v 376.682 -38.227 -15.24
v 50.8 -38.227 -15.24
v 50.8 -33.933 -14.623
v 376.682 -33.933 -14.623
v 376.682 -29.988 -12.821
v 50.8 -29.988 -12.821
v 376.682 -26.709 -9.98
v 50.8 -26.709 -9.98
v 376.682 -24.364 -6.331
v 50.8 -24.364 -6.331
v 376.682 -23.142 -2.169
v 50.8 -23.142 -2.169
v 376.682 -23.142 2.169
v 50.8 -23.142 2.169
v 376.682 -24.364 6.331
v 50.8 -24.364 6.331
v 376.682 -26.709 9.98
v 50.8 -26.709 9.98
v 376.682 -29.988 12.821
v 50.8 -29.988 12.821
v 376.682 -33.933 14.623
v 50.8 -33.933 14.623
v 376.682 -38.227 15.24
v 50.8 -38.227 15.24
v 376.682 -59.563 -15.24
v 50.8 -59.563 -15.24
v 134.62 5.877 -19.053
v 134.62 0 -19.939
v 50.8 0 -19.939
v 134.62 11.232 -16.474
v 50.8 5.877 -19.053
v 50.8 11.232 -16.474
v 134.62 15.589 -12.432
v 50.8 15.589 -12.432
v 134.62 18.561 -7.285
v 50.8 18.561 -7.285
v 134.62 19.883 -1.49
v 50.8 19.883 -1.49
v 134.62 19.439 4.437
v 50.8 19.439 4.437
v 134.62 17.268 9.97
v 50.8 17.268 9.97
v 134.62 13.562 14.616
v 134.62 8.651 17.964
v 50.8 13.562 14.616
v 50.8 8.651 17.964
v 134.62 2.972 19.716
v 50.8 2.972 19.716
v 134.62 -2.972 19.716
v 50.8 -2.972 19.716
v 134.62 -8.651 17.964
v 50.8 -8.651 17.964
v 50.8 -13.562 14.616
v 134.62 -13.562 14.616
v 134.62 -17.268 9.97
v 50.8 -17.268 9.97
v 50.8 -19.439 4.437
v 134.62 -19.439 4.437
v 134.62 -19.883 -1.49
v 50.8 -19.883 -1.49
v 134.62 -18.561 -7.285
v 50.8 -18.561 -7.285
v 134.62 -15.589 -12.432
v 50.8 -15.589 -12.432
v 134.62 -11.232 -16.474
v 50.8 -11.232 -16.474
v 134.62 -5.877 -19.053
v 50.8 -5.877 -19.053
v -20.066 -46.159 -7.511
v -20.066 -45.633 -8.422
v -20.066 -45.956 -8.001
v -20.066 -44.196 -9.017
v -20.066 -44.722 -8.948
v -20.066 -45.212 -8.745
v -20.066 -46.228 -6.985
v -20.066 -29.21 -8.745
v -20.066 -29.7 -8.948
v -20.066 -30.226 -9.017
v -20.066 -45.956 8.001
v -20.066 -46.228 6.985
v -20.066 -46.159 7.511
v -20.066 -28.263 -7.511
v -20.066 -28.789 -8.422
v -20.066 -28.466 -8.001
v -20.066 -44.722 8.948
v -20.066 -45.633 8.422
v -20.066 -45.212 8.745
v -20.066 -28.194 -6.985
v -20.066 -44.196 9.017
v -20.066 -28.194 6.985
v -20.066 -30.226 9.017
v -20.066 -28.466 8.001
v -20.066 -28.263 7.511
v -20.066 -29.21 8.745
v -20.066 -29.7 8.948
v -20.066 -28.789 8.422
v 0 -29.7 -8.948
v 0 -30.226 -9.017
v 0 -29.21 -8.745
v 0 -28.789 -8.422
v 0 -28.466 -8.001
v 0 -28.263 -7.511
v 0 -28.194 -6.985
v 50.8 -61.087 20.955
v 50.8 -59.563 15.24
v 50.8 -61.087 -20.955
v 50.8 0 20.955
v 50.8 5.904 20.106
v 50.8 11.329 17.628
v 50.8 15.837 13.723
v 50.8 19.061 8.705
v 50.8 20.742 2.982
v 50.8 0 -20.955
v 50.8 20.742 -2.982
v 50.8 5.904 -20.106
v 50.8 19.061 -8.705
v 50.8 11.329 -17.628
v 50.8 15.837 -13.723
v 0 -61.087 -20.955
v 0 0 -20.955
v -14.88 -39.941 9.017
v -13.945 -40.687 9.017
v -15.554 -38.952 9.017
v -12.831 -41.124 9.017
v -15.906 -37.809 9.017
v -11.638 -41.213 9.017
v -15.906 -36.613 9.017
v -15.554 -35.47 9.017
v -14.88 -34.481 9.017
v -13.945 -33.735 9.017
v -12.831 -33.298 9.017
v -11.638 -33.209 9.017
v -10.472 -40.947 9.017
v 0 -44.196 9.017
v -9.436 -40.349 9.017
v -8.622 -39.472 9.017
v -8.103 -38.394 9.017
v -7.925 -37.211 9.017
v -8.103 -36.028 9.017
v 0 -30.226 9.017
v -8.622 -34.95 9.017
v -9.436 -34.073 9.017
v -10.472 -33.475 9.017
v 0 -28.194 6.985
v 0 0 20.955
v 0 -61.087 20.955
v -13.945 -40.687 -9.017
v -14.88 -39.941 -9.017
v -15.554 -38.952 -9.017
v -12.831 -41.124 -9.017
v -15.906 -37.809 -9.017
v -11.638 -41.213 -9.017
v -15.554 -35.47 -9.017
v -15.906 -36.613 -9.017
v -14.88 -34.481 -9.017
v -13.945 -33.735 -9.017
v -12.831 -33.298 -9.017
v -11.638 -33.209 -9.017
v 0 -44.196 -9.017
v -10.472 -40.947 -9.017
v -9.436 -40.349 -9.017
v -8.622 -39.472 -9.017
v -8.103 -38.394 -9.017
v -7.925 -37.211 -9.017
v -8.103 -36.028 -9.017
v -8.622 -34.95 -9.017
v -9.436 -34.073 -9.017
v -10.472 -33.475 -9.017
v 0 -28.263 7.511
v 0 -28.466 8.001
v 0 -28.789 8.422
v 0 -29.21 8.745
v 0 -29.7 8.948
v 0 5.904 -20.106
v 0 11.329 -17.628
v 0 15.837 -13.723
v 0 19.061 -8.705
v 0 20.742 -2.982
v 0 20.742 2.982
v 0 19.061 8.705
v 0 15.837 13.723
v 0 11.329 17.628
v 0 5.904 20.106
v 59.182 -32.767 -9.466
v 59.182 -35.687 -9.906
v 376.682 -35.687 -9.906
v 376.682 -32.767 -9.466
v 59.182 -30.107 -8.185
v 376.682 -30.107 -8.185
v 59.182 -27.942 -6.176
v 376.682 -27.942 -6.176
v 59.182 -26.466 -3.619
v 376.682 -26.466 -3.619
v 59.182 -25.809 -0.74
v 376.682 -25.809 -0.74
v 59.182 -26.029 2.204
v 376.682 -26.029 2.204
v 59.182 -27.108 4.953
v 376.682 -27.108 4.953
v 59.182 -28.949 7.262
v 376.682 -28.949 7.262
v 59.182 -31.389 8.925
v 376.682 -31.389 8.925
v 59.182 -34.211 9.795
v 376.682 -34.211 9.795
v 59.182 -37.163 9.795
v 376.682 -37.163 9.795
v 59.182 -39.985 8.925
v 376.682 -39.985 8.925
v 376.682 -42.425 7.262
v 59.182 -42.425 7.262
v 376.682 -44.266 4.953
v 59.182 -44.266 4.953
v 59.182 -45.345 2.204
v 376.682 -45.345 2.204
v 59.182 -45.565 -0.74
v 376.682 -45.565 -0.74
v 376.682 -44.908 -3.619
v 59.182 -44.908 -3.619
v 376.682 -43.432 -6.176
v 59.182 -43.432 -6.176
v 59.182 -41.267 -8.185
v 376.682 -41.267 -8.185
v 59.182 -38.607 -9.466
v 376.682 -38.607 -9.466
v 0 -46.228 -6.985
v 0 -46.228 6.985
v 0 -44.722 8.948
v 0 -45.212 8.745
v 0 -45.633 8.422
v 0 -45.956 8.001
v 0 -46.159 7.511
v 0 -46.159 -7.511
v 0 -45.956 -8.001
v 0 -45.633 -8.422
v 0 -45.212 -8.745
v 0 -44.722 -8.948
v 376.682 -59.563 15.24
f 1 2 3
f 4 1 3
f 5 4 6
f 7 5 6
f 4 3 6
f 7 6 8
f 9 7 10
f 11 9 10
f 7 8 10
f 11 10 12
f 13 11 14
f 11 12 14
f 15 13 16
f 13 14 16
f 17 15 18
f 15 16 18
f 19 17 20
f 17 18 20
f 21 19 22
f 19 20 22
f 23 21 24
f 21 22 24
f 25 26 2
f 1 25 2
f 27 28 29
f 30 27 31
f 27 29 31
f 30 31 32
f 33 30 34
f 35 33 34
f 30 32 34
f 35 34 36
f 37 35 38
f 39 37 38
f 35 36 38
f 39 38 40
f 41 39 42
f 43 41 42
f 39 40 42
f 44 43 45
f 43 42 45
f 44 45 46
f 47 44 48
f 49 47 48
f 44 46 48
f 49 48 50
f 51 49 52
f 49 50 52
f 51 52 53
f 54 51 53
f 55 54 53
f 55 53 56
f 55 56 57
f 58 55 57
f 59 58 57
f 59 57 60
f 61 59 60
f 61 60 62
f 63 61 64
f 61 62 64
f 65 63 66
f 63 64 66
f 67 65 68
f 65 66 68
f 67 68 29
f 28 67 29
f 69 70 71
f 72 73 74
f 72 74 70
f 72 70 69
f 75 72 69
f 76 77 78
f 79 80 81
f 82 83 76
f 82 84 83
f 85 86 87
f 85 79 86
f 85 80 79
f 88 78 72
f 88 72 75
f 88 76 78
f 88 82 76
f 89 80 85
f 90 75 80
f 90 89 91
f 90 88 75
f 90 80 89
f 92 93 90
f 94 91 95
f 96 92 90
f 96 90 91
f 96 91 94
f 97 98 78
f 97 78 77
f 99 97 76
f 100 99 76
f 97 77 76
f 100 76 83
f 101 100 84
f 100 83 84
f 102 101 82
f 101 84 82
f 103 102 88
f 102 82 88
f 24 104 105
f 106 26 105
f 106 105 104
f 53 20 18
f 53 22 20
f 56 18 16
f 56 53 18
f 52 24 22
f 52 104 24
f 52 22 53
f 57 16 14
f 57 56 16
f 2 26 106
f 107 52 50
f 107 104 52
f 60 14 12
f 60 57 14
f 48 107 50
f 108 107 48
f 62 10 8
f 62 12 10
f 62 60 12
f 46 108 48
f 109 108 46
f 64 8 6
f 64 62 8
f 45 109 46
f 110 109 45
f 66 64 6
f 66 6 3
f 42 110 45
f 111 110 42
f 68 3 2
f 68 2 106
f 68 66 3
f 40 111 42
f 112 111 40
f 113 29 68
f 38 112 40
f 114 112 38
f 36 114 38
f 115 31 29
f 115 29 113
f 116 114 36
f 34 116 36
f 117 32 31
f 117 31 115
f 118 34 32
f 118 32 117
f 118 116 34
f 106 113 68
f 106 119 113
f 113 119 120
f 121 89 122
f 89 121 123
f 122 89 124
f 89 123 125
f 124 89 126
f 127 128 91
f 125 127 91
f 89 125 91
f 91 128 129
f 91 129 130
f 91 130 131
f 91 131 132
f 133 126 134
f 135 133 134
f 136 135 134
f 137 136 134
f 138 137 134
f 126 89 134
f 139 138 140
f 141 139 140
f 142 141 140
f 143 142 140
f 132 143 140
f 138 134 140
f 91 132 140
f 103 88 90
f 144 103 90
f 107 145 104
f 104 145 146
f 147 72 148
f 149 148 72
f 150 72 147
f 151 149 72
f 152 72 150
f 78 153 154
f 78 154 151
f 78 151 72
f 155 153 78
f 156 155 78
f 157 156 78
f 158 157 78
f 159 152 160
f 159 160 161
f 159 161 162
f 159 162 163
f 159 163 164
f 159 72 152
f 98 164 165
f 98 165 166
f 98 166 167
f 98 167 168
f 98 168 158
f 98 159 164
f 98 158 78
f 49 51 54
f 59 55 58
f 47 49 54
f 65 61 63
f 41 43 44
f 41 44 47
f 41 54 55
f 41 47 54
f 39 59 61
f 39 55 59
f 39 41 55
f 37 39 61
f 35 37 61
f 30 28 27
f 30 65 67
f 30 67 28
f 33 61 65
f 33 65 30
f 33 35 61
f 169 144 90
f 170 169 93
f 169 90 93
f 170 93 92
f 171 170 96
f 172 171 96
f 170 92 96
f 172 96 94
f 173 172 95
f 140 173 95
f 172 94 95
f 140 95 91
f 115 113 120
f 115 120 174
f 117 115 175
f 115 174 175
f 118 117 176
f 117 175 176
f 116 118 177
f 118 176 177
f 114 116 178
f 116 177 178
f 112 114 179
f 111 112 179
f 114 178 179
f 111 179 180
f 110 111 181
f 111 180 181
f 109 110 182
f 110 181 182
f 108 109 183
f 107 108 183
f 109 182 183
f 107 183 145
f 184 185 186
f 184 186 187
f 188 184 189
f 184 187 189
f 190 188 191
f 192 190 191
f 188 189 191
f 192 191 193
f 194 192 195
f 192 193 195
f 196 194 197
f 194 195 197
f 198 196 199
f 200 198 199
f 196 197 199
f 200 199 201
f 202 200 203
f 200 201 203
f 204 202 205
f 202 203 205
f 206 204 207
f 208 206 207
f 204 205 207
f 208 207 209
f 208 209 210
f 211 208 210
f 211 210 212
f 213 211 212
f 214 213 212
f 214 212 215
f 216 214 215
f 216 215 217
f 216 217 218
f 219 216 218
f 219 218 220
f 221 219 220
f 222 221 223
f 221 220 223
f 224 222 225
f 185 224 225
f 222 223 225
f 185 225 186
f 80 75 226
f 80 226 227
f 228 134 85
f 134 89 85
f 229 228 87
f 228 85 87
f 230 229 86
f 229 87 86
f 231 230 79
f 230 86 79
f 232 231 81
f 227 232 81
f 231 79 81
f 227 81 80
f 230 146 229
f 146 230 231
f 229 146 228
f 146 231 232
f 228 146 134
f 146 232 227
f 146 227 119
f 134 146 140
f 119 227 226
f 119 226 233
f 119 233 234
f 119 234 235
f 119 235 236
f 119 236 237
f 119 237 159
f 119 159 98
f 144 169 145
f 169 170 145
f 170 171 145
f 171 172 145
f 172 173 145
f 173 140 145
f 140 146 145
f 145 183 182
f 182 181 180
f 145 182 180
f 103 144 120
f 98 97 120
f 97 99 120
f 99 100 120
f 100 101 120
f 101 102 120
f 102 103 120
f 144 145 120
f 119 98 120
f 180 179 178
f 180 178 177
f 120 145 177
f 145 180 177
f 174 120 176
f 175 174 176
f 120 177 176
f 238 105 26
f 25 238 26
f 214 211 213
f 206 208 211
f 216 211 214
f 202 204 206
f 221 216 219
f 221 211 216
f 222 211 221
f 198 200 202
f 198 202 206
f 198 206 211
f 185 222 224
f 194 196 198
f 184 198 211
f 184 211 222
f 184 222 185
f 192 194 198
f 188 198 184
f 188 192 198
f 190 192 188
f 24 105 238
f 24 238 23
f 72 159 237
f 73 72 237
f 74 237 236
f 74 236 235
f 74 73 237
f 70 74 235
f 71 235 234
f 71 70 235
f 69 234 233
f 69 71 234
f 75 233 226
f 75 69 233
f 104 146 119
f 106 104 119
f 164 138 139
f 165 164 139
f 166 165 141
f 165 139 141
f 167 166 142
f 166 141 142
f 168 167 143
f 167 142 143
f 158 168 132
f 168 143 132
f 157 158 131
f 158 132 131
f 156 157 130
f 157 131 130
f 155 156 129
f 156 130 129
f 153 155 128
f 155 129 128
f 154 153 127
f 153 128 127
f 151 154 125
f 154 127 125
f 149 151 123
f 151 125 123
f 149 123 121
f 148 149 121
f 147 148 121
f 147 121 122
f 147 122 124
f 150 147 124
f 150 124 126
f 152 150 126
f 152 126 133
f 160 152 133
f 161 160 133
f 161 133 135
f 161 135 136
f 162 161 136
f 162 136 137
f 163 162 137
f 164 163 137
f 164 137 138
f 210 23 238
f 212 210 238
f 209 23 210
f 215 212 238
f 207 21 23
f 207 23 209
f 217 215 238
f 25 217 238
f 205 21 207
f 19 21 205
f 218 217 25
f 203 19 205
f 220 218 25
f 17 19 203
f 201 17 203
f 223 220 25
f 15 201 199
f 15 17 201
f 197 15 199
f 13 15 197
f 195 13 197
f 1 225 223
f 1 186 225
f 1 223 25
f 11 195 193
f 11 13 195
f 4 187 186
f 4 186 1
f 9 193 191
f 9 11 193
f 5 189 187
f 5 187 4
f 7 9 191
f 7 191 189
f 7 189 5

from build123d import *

# Parameters (mm, degrees)
BOSS_EXTRUDE1_DEPTH = 50.8
SKETCH2_R           = 19.939
BOSS_EXTRUDE2_DEPTH = 83.82
SKETCH3_W           = 30.48
SKETCH3_H           = 21.336
BOSS_EXTRUDE3_DEPTH = 325.882
SKETCH4_W           = 18.034
SKETCH4_H           = 18.034
BOSS_EXTRUDE4_DEPTH = 20.066
FILLET2_R           = 2.032
SKETCH5_R           = 4.0132
CUT_EXTRUDE1_DEPTH  = 383.778358162
SKETCH6_R           = 9.906
CUT_EXTRUDE2_DEPTH  = 317.5


with BuildPart() as part:
    # Sketch1 → Boss-Extrude1 (new body)
    with BuildSketch(Plane(origin=(0, 0, 0), x_dir=(0, 0, -1), z_dir=(1, 0, 0))):
        with BuildLine():
            Line((-20.955, 0), (-20.955, -61.087))
            Line((-20.955, -61.087), (20.955, -61.087))
            Line((20.955, -61.087), (20.955, 0))
            ThreePointArc((20.955, 0), (0, 20.955), (-20.955, 0))
        make_face()
    extrude(amount=BOSS_EXTRUDE1_DEPTH)

    # Sketch2 → Boss-Extrude2 (add)
    with BuildSketch(Plane(origin=(50.8, 0, 0), x_dir=(0, 0, -1), z_dir=(1, 0, 0))):
        Circle(SKETCH2_R)
    extrude(amount=BOSS_EXTRUDE2_DEPTH)

    # Sketch3 → Boss-Extrude3 (add)
    with BuildSketch(Plane(origin=(50.8, 0, 0), x_dir=(0, 0, -1), z_dir=(1, 0, 0))):
        with BuildLine():
            Line((-15.24, -38.227), (15.24, -38.227))
            ThreePointArc((15.24, -38.227), (0, -22.987), (-15.24, -38.227))
        make_face()
        with Locations((0, -48.895)):
            Rectangle(SKETCH3_W, SKETCH3_H)
    extrude(amount=BOSS_EXTRUDE3_DEPTH)

    # Sketch4 → Boss-Extrude4 (add)
    with BuildSketch(Plane.ZY):
        with Locations((0, -37.211)):
            Rectangle(SKETCH4_W, SKETCH4_H)
    extrude(amount=BOSS_EXTRUDE4_DEPTH)

    # Fillet2
    fillet2_edges = [part.edges().sort_by_distance(p)[0] for p in [
        (-10.033, -28.194, -9.017),
        (-10.033, -46.228, -9.017),
        (-10.033, -46.228, 9.017),
        (-10.033, -28.194, 9.017),
    ]]
    fillet(fillet2_edges, radius=FILLET2_R)

    # Sketch5 → Cut-Extrude1 (cut, through all)
    with BuildSketch(Plane.XY.offset(9.017)):
        with Locations((-11.938, -37.211)):
            Circle(SKETCH5_R)
    extrude(amount=-CUT_EXTRUDE1_DEPTH, mode=Mode.SUBTRACT)

    # Sketch6 → Cut-Extrude2 (cut)
    with BuildSketch(Plane(origin=(376.682, 0, 0), x_dir=(0, 0, -1), z_dir=(1, 0, 0))):
        with Locations((0, -35.687)):
            Circle(SKETCH6_R)
    extrude(amount=-CUT_EXTRUDE2_DEPTH, mode=Mode.SUBTRACT)


solid = part.part
